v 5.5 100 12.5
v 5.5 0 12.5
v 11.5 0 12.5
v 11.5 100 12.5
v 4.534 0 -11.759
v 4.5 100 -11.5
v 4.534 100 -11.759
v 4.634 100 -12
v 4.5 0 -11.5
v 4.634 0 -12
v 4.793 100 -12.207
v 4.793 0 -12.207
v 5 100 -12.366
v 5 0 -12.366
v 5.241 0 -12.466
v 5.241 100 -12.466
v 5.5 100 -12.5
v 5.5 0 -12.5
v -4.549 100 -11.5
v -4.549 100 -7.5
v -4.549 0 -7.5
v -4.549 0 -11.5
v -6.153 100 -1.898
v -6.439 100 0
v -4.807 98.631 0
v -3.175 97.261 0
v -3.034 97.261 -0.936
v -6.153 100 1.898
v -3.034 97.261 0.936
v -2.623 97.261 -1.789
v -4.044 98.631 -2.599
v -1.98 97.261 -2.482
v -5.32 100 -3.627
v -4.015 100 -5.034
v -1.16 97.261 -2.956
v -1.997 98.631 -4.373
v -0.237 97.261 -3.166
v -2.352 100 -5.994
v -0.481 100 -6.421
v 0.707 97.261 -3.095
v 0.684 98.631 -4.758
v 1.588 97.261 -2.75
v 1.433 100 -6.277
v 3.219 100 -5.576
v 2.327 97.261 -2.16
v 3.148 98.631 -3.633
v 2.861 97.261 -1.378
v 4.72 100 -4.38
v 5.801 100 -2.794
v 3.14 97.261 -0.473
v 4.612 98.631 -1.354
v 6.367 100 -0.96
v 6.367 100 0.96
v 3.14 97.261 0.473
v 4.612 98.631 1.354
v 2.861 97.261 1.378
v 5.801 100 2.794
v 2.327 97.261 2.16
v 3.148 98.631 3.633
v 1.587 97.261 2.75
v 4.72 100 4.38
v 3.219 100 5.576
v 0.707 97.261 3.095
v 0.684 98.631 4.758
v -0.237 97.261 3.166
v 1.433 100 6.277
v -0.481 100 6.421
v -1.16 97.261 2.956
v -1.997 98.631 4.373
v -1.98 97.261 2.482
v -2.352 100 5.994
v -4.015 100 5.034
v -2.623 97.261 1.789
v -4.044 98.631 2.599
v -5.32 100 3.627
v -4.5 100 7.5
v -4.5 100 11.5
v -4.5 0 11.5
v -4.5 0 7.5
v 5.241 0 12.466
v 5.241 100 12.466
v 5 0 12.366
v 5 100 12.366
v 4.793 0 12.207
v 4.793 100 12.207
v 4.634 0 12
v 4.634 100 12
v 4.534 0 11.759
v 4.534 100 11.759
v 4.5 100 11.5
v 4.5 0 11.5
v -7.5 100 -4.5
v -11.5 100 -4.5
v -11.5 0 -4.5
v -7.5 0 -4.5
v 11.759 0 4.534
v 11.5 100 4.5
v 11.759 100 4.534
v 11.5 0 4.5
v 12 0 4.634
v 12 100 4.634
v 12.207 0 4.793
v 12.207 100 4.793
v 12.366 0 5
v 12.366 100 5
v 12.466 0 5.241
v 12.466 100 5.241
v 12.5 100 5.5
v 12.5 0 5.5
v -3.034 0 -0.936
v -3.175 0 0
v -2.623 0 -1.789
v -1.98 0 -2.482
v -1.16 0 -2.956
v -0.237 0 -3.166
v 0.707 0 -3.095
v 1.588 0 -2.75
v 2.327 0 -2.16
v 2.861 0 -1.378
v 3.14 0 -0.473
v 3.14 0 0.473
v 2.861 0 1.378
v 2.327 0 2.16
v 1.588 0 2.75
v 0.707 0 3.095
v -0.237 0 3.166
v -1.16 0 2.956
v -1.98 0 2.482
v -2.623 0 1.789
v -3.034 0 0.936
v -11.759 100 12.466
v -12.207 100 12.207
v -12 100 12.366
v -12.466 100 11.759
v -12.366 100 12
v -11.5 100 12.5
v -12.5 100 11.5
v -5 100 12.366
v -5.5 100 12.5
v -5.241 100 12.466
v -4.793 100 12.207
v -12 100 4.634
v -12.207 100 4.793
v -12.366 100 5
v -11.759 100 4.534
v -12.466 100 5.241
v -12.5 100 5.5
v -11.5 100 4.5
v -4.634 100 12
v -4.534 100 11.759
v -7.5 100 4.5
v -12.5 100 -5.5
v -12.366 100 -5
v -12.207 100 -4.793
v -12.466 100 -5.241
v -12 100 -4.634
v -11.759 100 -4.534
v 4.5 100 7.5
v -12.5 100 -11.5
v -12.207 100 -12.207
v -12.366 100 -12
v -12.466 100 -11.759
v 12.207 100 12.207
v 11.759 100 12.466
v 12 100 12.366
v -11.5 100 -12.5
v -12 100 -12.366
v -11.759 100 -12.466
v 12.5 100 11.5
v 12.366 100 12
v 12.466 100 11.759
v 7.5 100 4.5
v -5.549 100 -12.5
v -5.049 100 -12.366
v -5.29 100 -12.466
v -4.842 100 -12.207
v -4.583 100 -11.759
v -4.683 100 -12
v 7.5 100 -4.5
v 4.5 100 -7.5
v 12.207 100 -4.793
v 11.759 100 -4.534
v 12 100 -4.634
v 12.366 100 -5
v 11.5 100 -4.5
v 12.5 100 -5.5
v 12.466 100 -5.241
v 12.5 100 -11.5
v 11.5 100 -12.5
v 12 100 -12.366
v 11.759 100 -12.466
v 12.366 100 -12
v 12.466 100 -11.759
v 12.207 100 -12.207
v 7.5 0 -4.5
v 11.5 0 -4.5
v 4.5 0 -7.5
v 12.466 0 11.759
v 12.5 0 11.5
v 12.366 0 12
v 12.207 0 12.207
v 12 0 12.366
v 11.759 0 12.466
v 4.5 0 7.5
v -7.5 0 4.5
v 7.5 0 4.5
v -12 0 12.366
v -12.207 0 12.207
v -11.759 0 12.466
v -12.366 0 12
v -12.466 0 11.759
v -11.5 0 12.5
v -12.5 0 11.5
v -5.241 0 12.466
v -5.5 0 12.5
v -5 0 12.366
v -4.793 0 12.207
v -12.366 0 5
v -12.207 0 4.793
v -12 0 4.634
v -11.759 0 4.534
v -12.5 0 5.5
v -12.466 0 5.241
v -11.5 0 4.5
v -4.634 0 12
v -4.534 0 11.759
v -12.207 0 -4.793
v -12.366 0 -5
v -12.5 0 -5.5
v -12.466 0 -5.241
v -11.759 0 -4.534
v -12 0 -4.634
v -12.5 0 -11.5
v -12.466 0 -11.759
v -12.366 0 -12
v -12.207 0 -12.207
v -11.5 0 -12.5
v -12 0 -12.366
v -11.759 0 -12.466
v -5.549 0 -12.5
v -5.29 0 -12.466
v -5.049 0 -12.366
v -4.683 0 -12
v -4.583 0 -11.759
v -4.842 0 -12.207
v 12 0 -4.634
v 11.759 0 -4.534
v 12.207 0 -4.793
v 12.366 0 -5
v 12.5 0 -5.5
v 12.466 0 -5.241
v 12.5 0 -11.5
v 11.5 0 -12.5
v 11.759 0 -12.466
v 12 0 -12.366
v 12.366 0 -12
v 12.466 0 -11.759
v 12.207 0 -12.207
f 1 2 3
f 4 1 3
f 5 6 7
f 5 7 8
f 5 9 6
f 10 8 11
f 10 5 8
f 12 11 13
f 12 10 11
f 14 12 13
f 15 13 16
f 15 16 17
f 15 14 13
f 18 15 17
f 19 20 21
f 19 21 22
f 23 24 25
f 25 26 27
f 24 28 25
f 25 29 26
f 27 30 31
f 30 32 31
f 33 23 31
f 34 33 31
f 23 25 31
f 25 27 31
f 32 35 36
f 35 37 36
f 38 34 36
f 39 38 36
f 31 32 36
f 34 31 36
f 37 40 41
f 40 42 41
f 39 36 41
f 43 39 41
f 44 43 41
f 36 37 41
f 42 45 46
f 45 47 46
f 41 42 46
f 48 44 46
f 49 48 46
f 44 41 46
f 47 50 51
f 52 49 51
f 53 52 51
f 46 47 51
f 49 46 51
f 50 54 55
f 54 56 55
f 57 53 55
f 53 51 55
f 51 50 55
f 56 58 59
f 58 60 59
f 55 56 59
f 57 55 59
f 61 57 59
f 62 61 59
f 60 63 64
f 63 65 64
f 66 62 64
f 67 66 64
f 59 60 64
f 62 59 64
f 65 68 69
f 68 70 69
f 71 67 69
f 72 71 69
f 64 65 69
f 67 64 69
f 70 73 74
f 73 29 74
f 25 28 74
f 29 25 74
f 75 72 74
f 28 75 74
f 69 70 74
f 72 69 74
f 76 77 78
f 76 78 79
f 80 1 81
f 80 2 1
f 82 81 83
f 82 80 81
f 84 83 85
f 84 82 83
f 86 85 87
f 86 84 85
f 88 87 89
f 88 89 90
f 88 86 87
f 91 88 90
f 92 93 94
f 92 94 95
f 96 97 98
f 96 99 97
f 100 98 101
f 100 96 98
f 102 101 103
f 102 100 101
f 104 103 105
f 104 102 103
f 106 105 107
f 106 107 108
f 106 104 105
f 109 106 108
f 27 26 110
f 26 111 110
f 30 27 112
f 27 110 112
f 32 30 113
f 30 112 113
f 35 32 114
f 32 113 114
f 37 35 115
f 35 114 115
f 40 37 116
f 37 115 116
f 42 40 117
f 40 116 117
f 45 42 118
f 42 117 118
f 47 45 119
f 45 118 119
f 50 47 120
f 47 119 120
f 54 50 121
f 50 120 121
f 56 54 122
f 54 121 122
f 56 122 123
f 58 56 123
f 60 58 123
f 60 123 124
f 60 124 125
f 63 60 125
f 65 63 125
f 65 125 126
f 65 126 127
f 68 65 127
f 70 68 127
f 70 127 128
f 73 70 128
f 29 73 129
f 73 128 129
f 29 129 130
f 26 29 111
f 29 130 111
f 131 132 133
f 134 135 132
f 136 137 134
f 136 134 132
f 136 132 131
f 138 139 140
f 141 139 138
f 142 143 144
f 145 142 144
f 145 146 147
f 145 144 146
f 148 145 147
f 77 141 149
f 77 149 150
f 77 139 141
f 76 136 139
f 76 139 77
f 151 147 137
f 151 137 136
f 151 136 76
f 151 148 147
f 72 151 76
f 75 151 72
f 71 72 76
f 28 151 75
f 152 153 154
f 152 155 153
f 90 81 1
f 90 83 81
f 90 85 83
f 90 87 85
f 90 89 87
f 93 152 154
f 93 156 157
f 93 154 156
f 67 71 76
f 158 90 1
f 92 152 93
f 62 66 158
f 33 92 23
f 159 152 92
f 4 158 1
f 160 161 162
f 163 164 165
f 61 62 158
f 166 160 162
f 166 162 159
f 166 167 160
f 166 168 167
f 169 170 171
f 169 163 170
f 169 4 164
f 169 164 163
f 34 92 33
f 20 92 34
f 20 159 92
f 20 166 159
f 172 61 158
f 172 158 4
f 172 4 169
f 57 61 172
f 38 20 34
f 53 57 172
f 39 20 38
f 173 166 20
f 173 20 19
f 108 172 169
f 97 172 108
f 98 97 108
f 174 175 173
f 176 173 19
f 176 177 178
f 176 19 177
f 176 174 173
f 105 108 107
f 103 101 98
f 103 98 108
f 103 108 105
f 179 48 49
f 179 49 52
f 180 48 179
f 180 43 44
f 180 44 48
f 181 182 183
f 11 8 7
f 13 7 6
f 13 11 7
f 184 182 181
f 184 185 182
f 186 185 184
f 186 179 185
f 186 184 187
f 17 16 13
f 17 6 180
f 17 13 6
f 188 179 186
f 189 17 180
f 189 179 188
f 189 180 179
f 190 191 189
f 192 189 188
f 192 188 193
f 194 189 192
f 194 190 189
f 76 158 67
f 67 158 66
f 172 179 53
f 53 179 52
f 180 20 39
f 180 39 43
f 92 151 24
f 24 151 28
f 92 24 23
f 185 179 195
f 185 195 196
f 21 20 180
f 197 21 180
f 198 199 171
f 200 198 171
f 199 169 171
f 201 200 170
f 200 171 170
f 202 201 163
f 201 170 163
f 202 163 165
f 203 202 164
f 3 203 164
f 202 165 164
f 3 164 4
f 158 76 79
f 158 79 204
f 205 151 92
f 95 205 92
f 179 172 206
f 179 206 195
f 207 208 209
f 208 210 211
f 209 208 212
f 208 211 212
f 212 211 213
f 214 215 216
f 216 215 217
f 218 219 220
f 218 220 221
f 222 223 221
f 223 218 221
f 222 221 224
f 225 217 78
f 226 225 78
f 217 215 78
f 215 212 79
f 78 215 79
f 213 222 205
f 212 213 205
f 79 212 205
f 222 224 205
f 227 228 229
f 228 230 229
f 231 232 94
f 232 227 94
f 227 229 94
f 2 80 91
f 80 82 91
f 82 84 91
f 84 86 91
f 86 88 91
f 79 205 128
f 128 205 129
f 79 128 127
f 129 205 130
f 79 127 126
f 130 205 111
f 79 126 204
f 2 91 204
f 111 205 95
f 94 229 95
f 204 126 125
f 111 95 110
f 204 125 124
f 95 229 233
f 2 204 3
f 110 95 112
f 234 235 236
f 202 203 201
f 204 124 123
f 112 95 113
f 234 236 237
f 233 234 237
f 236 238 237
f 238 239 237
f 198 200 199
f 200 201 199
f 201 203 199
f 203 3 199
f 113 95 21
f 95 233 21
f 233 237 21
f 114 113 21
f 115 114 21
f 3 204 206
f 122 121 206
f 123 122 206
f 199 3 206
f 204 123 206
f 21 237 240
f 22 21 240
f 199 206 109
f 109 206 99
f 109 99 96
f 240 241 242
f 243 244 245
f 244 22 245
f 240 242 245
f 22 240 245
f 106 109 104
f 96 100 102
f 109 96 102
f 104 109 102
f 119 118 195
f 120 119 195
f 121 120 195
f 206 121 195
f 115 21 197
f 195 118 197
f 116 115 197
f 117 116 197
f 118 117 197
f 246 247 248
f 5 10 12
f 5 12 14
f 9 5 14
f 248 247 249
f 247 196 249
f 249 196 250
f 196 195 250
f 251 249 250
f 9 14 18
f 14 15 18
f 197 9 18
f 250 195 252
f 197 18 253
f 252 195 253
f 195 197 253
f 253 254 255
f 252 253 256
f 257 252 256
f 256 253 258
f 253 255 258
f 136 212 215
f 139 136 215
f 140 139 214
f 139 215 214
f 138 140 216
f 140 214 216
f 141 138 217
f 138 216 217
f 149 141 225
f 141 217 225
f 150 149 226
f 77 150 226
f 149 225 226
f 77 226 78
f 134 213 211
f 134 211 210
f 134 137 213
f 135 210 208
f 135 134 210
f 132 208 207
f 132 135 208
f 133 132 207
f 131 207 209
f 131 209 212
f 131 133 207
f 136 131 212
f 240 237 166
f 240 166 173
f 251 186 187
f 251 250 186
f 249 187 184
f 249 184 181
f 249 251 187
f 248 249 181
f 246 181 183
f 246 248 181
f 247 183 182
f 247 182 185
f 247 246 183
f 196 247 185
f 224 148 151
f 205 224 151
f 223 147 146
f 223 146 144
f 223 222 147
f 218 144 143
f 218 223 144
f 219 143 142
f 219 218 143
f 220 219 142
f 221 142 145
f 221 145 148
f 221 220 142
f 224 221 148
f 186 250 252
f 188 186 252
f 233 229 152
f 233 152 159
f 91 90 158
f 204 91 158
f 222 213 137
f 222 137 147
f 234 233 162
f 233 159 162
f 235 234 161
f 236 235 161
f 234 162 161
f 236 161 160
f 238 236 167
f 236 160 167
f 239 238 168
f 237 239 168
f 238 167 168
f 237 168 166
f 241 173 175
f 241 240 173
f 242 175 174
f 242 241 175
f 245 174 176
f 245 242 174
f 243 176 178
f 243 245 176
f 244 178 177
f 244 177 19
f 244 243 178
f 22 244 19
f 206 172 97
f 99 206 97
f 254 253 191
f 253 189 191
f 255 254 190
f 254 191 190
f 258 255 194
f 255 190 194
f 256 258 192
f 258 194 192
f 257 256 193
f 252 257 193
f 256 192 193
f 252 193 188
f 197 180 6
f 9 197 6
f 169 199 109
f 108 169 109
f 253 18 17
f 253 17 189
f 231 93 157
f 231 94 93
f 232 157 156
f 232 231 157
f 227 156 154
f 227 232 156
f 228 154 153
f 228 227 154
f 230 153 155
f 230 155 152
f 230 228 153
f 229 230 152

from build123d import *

# Parameters (mm, degrees)
SKETCH1_W                             = 25
SKETCH1_H                             = 25
BOSS_EXTRUDE1_DEPTH                   = 100
SKETCH2_W                             = 5
SKETCH2_H                             = 9
SKETCH2_W_2                           = 9
SKETCH2_H_2                           = 5
SKETCH2_W_3                           = 9.048888394
CUT_EXTRUDE1_DEPTH                    = 100
FILLET1_R                             = 1
F_1_4_0_25_DIAMETER_HOLE1_D           = 6.35
F_1_4_0_25_DIAMETER_HOLE1_CSINK_D     = 12.8778
F_1_4_0_25_DIAMETER_HOLE1_CSINK_ANGLE = 100


with BuildPart() as part:
    # Sketch1 → Boss-Extrude1 (new body)
    with BuildSketch(Plane(origin=(0, 0, 0), x_dir=(1, 0, 0), z_dir=(0, 1, 0))):
        Rectangle(SKETCH1_W, SKETCH1_H)
    extrude(amount=BOSS_EXTRUDE1_DEPTH)

    # Sketch2 → Cut-Extrude1 (cut)
    with BuildSketch(Plane(origin=(0, 100, 0), x_dir=(1, 0, 0), z_dir=(0, 1, 0))):
        with Locations((-10, 0)):
            Rectangle(SKETCH2_W, SKETCH2_H)
        with Locations((0, -10)):
            Rectangle(SKETCH2_W_2, SKETCH2_H_2)
        with Locations((-0.024444197, 10)):
            Rectangle(SKETCH2_W_3, SKETCH2_H_2)
        with Locations((10, 0)):
            Rectangle(SKETCH2_W, SKETCH2_H)
    extrude(amount=-CUT_EXTRUDE1_DEPTH, mode=Mode.SUBTRACT)

    # Fillet1
    fillet1_edges = [part.edges().sort_by_distance(p)[0] for p in [
        (-12.5, 50, 4.5),
        (-12.5, 50, -4.5),
        (-4.548888394, 50, -12.5),
        (4.5, 50, -12.5),
        (-4.5, 50, 12.5),
        (4.5, 50, 12.5),
        (12.5, 50, -4.5),
        (12.5, 50, 4.5),
        (12.5, 50, 12.5),
        (-12.5, 50, 12.5),
        (-12.5, 50, -12.5),
        (12.5, 50, -12.5),
    ]]
    fillet(fillet1_edges, radius=FILLET1_R)

    # 1/4 (0.25) Diameter Hole1 (through all)
    with Locations(Plane(origin=(0, 100, 0), x_dir=(1, 0, 0), z_dir=(0, 1, 0))):
        with Locations((0, 0)):
            CounterSinkHole(F_1_4_0_25_DIAMETER_HOLE1_D / 2, F_1_4_0_25_DIAMETER_HOLE1_CSINK_D / 2, counter_sink_angle=F_1_4_0_25_DIAMETER_HOLE1_CSINK_ANGLE)


solid = part.part
